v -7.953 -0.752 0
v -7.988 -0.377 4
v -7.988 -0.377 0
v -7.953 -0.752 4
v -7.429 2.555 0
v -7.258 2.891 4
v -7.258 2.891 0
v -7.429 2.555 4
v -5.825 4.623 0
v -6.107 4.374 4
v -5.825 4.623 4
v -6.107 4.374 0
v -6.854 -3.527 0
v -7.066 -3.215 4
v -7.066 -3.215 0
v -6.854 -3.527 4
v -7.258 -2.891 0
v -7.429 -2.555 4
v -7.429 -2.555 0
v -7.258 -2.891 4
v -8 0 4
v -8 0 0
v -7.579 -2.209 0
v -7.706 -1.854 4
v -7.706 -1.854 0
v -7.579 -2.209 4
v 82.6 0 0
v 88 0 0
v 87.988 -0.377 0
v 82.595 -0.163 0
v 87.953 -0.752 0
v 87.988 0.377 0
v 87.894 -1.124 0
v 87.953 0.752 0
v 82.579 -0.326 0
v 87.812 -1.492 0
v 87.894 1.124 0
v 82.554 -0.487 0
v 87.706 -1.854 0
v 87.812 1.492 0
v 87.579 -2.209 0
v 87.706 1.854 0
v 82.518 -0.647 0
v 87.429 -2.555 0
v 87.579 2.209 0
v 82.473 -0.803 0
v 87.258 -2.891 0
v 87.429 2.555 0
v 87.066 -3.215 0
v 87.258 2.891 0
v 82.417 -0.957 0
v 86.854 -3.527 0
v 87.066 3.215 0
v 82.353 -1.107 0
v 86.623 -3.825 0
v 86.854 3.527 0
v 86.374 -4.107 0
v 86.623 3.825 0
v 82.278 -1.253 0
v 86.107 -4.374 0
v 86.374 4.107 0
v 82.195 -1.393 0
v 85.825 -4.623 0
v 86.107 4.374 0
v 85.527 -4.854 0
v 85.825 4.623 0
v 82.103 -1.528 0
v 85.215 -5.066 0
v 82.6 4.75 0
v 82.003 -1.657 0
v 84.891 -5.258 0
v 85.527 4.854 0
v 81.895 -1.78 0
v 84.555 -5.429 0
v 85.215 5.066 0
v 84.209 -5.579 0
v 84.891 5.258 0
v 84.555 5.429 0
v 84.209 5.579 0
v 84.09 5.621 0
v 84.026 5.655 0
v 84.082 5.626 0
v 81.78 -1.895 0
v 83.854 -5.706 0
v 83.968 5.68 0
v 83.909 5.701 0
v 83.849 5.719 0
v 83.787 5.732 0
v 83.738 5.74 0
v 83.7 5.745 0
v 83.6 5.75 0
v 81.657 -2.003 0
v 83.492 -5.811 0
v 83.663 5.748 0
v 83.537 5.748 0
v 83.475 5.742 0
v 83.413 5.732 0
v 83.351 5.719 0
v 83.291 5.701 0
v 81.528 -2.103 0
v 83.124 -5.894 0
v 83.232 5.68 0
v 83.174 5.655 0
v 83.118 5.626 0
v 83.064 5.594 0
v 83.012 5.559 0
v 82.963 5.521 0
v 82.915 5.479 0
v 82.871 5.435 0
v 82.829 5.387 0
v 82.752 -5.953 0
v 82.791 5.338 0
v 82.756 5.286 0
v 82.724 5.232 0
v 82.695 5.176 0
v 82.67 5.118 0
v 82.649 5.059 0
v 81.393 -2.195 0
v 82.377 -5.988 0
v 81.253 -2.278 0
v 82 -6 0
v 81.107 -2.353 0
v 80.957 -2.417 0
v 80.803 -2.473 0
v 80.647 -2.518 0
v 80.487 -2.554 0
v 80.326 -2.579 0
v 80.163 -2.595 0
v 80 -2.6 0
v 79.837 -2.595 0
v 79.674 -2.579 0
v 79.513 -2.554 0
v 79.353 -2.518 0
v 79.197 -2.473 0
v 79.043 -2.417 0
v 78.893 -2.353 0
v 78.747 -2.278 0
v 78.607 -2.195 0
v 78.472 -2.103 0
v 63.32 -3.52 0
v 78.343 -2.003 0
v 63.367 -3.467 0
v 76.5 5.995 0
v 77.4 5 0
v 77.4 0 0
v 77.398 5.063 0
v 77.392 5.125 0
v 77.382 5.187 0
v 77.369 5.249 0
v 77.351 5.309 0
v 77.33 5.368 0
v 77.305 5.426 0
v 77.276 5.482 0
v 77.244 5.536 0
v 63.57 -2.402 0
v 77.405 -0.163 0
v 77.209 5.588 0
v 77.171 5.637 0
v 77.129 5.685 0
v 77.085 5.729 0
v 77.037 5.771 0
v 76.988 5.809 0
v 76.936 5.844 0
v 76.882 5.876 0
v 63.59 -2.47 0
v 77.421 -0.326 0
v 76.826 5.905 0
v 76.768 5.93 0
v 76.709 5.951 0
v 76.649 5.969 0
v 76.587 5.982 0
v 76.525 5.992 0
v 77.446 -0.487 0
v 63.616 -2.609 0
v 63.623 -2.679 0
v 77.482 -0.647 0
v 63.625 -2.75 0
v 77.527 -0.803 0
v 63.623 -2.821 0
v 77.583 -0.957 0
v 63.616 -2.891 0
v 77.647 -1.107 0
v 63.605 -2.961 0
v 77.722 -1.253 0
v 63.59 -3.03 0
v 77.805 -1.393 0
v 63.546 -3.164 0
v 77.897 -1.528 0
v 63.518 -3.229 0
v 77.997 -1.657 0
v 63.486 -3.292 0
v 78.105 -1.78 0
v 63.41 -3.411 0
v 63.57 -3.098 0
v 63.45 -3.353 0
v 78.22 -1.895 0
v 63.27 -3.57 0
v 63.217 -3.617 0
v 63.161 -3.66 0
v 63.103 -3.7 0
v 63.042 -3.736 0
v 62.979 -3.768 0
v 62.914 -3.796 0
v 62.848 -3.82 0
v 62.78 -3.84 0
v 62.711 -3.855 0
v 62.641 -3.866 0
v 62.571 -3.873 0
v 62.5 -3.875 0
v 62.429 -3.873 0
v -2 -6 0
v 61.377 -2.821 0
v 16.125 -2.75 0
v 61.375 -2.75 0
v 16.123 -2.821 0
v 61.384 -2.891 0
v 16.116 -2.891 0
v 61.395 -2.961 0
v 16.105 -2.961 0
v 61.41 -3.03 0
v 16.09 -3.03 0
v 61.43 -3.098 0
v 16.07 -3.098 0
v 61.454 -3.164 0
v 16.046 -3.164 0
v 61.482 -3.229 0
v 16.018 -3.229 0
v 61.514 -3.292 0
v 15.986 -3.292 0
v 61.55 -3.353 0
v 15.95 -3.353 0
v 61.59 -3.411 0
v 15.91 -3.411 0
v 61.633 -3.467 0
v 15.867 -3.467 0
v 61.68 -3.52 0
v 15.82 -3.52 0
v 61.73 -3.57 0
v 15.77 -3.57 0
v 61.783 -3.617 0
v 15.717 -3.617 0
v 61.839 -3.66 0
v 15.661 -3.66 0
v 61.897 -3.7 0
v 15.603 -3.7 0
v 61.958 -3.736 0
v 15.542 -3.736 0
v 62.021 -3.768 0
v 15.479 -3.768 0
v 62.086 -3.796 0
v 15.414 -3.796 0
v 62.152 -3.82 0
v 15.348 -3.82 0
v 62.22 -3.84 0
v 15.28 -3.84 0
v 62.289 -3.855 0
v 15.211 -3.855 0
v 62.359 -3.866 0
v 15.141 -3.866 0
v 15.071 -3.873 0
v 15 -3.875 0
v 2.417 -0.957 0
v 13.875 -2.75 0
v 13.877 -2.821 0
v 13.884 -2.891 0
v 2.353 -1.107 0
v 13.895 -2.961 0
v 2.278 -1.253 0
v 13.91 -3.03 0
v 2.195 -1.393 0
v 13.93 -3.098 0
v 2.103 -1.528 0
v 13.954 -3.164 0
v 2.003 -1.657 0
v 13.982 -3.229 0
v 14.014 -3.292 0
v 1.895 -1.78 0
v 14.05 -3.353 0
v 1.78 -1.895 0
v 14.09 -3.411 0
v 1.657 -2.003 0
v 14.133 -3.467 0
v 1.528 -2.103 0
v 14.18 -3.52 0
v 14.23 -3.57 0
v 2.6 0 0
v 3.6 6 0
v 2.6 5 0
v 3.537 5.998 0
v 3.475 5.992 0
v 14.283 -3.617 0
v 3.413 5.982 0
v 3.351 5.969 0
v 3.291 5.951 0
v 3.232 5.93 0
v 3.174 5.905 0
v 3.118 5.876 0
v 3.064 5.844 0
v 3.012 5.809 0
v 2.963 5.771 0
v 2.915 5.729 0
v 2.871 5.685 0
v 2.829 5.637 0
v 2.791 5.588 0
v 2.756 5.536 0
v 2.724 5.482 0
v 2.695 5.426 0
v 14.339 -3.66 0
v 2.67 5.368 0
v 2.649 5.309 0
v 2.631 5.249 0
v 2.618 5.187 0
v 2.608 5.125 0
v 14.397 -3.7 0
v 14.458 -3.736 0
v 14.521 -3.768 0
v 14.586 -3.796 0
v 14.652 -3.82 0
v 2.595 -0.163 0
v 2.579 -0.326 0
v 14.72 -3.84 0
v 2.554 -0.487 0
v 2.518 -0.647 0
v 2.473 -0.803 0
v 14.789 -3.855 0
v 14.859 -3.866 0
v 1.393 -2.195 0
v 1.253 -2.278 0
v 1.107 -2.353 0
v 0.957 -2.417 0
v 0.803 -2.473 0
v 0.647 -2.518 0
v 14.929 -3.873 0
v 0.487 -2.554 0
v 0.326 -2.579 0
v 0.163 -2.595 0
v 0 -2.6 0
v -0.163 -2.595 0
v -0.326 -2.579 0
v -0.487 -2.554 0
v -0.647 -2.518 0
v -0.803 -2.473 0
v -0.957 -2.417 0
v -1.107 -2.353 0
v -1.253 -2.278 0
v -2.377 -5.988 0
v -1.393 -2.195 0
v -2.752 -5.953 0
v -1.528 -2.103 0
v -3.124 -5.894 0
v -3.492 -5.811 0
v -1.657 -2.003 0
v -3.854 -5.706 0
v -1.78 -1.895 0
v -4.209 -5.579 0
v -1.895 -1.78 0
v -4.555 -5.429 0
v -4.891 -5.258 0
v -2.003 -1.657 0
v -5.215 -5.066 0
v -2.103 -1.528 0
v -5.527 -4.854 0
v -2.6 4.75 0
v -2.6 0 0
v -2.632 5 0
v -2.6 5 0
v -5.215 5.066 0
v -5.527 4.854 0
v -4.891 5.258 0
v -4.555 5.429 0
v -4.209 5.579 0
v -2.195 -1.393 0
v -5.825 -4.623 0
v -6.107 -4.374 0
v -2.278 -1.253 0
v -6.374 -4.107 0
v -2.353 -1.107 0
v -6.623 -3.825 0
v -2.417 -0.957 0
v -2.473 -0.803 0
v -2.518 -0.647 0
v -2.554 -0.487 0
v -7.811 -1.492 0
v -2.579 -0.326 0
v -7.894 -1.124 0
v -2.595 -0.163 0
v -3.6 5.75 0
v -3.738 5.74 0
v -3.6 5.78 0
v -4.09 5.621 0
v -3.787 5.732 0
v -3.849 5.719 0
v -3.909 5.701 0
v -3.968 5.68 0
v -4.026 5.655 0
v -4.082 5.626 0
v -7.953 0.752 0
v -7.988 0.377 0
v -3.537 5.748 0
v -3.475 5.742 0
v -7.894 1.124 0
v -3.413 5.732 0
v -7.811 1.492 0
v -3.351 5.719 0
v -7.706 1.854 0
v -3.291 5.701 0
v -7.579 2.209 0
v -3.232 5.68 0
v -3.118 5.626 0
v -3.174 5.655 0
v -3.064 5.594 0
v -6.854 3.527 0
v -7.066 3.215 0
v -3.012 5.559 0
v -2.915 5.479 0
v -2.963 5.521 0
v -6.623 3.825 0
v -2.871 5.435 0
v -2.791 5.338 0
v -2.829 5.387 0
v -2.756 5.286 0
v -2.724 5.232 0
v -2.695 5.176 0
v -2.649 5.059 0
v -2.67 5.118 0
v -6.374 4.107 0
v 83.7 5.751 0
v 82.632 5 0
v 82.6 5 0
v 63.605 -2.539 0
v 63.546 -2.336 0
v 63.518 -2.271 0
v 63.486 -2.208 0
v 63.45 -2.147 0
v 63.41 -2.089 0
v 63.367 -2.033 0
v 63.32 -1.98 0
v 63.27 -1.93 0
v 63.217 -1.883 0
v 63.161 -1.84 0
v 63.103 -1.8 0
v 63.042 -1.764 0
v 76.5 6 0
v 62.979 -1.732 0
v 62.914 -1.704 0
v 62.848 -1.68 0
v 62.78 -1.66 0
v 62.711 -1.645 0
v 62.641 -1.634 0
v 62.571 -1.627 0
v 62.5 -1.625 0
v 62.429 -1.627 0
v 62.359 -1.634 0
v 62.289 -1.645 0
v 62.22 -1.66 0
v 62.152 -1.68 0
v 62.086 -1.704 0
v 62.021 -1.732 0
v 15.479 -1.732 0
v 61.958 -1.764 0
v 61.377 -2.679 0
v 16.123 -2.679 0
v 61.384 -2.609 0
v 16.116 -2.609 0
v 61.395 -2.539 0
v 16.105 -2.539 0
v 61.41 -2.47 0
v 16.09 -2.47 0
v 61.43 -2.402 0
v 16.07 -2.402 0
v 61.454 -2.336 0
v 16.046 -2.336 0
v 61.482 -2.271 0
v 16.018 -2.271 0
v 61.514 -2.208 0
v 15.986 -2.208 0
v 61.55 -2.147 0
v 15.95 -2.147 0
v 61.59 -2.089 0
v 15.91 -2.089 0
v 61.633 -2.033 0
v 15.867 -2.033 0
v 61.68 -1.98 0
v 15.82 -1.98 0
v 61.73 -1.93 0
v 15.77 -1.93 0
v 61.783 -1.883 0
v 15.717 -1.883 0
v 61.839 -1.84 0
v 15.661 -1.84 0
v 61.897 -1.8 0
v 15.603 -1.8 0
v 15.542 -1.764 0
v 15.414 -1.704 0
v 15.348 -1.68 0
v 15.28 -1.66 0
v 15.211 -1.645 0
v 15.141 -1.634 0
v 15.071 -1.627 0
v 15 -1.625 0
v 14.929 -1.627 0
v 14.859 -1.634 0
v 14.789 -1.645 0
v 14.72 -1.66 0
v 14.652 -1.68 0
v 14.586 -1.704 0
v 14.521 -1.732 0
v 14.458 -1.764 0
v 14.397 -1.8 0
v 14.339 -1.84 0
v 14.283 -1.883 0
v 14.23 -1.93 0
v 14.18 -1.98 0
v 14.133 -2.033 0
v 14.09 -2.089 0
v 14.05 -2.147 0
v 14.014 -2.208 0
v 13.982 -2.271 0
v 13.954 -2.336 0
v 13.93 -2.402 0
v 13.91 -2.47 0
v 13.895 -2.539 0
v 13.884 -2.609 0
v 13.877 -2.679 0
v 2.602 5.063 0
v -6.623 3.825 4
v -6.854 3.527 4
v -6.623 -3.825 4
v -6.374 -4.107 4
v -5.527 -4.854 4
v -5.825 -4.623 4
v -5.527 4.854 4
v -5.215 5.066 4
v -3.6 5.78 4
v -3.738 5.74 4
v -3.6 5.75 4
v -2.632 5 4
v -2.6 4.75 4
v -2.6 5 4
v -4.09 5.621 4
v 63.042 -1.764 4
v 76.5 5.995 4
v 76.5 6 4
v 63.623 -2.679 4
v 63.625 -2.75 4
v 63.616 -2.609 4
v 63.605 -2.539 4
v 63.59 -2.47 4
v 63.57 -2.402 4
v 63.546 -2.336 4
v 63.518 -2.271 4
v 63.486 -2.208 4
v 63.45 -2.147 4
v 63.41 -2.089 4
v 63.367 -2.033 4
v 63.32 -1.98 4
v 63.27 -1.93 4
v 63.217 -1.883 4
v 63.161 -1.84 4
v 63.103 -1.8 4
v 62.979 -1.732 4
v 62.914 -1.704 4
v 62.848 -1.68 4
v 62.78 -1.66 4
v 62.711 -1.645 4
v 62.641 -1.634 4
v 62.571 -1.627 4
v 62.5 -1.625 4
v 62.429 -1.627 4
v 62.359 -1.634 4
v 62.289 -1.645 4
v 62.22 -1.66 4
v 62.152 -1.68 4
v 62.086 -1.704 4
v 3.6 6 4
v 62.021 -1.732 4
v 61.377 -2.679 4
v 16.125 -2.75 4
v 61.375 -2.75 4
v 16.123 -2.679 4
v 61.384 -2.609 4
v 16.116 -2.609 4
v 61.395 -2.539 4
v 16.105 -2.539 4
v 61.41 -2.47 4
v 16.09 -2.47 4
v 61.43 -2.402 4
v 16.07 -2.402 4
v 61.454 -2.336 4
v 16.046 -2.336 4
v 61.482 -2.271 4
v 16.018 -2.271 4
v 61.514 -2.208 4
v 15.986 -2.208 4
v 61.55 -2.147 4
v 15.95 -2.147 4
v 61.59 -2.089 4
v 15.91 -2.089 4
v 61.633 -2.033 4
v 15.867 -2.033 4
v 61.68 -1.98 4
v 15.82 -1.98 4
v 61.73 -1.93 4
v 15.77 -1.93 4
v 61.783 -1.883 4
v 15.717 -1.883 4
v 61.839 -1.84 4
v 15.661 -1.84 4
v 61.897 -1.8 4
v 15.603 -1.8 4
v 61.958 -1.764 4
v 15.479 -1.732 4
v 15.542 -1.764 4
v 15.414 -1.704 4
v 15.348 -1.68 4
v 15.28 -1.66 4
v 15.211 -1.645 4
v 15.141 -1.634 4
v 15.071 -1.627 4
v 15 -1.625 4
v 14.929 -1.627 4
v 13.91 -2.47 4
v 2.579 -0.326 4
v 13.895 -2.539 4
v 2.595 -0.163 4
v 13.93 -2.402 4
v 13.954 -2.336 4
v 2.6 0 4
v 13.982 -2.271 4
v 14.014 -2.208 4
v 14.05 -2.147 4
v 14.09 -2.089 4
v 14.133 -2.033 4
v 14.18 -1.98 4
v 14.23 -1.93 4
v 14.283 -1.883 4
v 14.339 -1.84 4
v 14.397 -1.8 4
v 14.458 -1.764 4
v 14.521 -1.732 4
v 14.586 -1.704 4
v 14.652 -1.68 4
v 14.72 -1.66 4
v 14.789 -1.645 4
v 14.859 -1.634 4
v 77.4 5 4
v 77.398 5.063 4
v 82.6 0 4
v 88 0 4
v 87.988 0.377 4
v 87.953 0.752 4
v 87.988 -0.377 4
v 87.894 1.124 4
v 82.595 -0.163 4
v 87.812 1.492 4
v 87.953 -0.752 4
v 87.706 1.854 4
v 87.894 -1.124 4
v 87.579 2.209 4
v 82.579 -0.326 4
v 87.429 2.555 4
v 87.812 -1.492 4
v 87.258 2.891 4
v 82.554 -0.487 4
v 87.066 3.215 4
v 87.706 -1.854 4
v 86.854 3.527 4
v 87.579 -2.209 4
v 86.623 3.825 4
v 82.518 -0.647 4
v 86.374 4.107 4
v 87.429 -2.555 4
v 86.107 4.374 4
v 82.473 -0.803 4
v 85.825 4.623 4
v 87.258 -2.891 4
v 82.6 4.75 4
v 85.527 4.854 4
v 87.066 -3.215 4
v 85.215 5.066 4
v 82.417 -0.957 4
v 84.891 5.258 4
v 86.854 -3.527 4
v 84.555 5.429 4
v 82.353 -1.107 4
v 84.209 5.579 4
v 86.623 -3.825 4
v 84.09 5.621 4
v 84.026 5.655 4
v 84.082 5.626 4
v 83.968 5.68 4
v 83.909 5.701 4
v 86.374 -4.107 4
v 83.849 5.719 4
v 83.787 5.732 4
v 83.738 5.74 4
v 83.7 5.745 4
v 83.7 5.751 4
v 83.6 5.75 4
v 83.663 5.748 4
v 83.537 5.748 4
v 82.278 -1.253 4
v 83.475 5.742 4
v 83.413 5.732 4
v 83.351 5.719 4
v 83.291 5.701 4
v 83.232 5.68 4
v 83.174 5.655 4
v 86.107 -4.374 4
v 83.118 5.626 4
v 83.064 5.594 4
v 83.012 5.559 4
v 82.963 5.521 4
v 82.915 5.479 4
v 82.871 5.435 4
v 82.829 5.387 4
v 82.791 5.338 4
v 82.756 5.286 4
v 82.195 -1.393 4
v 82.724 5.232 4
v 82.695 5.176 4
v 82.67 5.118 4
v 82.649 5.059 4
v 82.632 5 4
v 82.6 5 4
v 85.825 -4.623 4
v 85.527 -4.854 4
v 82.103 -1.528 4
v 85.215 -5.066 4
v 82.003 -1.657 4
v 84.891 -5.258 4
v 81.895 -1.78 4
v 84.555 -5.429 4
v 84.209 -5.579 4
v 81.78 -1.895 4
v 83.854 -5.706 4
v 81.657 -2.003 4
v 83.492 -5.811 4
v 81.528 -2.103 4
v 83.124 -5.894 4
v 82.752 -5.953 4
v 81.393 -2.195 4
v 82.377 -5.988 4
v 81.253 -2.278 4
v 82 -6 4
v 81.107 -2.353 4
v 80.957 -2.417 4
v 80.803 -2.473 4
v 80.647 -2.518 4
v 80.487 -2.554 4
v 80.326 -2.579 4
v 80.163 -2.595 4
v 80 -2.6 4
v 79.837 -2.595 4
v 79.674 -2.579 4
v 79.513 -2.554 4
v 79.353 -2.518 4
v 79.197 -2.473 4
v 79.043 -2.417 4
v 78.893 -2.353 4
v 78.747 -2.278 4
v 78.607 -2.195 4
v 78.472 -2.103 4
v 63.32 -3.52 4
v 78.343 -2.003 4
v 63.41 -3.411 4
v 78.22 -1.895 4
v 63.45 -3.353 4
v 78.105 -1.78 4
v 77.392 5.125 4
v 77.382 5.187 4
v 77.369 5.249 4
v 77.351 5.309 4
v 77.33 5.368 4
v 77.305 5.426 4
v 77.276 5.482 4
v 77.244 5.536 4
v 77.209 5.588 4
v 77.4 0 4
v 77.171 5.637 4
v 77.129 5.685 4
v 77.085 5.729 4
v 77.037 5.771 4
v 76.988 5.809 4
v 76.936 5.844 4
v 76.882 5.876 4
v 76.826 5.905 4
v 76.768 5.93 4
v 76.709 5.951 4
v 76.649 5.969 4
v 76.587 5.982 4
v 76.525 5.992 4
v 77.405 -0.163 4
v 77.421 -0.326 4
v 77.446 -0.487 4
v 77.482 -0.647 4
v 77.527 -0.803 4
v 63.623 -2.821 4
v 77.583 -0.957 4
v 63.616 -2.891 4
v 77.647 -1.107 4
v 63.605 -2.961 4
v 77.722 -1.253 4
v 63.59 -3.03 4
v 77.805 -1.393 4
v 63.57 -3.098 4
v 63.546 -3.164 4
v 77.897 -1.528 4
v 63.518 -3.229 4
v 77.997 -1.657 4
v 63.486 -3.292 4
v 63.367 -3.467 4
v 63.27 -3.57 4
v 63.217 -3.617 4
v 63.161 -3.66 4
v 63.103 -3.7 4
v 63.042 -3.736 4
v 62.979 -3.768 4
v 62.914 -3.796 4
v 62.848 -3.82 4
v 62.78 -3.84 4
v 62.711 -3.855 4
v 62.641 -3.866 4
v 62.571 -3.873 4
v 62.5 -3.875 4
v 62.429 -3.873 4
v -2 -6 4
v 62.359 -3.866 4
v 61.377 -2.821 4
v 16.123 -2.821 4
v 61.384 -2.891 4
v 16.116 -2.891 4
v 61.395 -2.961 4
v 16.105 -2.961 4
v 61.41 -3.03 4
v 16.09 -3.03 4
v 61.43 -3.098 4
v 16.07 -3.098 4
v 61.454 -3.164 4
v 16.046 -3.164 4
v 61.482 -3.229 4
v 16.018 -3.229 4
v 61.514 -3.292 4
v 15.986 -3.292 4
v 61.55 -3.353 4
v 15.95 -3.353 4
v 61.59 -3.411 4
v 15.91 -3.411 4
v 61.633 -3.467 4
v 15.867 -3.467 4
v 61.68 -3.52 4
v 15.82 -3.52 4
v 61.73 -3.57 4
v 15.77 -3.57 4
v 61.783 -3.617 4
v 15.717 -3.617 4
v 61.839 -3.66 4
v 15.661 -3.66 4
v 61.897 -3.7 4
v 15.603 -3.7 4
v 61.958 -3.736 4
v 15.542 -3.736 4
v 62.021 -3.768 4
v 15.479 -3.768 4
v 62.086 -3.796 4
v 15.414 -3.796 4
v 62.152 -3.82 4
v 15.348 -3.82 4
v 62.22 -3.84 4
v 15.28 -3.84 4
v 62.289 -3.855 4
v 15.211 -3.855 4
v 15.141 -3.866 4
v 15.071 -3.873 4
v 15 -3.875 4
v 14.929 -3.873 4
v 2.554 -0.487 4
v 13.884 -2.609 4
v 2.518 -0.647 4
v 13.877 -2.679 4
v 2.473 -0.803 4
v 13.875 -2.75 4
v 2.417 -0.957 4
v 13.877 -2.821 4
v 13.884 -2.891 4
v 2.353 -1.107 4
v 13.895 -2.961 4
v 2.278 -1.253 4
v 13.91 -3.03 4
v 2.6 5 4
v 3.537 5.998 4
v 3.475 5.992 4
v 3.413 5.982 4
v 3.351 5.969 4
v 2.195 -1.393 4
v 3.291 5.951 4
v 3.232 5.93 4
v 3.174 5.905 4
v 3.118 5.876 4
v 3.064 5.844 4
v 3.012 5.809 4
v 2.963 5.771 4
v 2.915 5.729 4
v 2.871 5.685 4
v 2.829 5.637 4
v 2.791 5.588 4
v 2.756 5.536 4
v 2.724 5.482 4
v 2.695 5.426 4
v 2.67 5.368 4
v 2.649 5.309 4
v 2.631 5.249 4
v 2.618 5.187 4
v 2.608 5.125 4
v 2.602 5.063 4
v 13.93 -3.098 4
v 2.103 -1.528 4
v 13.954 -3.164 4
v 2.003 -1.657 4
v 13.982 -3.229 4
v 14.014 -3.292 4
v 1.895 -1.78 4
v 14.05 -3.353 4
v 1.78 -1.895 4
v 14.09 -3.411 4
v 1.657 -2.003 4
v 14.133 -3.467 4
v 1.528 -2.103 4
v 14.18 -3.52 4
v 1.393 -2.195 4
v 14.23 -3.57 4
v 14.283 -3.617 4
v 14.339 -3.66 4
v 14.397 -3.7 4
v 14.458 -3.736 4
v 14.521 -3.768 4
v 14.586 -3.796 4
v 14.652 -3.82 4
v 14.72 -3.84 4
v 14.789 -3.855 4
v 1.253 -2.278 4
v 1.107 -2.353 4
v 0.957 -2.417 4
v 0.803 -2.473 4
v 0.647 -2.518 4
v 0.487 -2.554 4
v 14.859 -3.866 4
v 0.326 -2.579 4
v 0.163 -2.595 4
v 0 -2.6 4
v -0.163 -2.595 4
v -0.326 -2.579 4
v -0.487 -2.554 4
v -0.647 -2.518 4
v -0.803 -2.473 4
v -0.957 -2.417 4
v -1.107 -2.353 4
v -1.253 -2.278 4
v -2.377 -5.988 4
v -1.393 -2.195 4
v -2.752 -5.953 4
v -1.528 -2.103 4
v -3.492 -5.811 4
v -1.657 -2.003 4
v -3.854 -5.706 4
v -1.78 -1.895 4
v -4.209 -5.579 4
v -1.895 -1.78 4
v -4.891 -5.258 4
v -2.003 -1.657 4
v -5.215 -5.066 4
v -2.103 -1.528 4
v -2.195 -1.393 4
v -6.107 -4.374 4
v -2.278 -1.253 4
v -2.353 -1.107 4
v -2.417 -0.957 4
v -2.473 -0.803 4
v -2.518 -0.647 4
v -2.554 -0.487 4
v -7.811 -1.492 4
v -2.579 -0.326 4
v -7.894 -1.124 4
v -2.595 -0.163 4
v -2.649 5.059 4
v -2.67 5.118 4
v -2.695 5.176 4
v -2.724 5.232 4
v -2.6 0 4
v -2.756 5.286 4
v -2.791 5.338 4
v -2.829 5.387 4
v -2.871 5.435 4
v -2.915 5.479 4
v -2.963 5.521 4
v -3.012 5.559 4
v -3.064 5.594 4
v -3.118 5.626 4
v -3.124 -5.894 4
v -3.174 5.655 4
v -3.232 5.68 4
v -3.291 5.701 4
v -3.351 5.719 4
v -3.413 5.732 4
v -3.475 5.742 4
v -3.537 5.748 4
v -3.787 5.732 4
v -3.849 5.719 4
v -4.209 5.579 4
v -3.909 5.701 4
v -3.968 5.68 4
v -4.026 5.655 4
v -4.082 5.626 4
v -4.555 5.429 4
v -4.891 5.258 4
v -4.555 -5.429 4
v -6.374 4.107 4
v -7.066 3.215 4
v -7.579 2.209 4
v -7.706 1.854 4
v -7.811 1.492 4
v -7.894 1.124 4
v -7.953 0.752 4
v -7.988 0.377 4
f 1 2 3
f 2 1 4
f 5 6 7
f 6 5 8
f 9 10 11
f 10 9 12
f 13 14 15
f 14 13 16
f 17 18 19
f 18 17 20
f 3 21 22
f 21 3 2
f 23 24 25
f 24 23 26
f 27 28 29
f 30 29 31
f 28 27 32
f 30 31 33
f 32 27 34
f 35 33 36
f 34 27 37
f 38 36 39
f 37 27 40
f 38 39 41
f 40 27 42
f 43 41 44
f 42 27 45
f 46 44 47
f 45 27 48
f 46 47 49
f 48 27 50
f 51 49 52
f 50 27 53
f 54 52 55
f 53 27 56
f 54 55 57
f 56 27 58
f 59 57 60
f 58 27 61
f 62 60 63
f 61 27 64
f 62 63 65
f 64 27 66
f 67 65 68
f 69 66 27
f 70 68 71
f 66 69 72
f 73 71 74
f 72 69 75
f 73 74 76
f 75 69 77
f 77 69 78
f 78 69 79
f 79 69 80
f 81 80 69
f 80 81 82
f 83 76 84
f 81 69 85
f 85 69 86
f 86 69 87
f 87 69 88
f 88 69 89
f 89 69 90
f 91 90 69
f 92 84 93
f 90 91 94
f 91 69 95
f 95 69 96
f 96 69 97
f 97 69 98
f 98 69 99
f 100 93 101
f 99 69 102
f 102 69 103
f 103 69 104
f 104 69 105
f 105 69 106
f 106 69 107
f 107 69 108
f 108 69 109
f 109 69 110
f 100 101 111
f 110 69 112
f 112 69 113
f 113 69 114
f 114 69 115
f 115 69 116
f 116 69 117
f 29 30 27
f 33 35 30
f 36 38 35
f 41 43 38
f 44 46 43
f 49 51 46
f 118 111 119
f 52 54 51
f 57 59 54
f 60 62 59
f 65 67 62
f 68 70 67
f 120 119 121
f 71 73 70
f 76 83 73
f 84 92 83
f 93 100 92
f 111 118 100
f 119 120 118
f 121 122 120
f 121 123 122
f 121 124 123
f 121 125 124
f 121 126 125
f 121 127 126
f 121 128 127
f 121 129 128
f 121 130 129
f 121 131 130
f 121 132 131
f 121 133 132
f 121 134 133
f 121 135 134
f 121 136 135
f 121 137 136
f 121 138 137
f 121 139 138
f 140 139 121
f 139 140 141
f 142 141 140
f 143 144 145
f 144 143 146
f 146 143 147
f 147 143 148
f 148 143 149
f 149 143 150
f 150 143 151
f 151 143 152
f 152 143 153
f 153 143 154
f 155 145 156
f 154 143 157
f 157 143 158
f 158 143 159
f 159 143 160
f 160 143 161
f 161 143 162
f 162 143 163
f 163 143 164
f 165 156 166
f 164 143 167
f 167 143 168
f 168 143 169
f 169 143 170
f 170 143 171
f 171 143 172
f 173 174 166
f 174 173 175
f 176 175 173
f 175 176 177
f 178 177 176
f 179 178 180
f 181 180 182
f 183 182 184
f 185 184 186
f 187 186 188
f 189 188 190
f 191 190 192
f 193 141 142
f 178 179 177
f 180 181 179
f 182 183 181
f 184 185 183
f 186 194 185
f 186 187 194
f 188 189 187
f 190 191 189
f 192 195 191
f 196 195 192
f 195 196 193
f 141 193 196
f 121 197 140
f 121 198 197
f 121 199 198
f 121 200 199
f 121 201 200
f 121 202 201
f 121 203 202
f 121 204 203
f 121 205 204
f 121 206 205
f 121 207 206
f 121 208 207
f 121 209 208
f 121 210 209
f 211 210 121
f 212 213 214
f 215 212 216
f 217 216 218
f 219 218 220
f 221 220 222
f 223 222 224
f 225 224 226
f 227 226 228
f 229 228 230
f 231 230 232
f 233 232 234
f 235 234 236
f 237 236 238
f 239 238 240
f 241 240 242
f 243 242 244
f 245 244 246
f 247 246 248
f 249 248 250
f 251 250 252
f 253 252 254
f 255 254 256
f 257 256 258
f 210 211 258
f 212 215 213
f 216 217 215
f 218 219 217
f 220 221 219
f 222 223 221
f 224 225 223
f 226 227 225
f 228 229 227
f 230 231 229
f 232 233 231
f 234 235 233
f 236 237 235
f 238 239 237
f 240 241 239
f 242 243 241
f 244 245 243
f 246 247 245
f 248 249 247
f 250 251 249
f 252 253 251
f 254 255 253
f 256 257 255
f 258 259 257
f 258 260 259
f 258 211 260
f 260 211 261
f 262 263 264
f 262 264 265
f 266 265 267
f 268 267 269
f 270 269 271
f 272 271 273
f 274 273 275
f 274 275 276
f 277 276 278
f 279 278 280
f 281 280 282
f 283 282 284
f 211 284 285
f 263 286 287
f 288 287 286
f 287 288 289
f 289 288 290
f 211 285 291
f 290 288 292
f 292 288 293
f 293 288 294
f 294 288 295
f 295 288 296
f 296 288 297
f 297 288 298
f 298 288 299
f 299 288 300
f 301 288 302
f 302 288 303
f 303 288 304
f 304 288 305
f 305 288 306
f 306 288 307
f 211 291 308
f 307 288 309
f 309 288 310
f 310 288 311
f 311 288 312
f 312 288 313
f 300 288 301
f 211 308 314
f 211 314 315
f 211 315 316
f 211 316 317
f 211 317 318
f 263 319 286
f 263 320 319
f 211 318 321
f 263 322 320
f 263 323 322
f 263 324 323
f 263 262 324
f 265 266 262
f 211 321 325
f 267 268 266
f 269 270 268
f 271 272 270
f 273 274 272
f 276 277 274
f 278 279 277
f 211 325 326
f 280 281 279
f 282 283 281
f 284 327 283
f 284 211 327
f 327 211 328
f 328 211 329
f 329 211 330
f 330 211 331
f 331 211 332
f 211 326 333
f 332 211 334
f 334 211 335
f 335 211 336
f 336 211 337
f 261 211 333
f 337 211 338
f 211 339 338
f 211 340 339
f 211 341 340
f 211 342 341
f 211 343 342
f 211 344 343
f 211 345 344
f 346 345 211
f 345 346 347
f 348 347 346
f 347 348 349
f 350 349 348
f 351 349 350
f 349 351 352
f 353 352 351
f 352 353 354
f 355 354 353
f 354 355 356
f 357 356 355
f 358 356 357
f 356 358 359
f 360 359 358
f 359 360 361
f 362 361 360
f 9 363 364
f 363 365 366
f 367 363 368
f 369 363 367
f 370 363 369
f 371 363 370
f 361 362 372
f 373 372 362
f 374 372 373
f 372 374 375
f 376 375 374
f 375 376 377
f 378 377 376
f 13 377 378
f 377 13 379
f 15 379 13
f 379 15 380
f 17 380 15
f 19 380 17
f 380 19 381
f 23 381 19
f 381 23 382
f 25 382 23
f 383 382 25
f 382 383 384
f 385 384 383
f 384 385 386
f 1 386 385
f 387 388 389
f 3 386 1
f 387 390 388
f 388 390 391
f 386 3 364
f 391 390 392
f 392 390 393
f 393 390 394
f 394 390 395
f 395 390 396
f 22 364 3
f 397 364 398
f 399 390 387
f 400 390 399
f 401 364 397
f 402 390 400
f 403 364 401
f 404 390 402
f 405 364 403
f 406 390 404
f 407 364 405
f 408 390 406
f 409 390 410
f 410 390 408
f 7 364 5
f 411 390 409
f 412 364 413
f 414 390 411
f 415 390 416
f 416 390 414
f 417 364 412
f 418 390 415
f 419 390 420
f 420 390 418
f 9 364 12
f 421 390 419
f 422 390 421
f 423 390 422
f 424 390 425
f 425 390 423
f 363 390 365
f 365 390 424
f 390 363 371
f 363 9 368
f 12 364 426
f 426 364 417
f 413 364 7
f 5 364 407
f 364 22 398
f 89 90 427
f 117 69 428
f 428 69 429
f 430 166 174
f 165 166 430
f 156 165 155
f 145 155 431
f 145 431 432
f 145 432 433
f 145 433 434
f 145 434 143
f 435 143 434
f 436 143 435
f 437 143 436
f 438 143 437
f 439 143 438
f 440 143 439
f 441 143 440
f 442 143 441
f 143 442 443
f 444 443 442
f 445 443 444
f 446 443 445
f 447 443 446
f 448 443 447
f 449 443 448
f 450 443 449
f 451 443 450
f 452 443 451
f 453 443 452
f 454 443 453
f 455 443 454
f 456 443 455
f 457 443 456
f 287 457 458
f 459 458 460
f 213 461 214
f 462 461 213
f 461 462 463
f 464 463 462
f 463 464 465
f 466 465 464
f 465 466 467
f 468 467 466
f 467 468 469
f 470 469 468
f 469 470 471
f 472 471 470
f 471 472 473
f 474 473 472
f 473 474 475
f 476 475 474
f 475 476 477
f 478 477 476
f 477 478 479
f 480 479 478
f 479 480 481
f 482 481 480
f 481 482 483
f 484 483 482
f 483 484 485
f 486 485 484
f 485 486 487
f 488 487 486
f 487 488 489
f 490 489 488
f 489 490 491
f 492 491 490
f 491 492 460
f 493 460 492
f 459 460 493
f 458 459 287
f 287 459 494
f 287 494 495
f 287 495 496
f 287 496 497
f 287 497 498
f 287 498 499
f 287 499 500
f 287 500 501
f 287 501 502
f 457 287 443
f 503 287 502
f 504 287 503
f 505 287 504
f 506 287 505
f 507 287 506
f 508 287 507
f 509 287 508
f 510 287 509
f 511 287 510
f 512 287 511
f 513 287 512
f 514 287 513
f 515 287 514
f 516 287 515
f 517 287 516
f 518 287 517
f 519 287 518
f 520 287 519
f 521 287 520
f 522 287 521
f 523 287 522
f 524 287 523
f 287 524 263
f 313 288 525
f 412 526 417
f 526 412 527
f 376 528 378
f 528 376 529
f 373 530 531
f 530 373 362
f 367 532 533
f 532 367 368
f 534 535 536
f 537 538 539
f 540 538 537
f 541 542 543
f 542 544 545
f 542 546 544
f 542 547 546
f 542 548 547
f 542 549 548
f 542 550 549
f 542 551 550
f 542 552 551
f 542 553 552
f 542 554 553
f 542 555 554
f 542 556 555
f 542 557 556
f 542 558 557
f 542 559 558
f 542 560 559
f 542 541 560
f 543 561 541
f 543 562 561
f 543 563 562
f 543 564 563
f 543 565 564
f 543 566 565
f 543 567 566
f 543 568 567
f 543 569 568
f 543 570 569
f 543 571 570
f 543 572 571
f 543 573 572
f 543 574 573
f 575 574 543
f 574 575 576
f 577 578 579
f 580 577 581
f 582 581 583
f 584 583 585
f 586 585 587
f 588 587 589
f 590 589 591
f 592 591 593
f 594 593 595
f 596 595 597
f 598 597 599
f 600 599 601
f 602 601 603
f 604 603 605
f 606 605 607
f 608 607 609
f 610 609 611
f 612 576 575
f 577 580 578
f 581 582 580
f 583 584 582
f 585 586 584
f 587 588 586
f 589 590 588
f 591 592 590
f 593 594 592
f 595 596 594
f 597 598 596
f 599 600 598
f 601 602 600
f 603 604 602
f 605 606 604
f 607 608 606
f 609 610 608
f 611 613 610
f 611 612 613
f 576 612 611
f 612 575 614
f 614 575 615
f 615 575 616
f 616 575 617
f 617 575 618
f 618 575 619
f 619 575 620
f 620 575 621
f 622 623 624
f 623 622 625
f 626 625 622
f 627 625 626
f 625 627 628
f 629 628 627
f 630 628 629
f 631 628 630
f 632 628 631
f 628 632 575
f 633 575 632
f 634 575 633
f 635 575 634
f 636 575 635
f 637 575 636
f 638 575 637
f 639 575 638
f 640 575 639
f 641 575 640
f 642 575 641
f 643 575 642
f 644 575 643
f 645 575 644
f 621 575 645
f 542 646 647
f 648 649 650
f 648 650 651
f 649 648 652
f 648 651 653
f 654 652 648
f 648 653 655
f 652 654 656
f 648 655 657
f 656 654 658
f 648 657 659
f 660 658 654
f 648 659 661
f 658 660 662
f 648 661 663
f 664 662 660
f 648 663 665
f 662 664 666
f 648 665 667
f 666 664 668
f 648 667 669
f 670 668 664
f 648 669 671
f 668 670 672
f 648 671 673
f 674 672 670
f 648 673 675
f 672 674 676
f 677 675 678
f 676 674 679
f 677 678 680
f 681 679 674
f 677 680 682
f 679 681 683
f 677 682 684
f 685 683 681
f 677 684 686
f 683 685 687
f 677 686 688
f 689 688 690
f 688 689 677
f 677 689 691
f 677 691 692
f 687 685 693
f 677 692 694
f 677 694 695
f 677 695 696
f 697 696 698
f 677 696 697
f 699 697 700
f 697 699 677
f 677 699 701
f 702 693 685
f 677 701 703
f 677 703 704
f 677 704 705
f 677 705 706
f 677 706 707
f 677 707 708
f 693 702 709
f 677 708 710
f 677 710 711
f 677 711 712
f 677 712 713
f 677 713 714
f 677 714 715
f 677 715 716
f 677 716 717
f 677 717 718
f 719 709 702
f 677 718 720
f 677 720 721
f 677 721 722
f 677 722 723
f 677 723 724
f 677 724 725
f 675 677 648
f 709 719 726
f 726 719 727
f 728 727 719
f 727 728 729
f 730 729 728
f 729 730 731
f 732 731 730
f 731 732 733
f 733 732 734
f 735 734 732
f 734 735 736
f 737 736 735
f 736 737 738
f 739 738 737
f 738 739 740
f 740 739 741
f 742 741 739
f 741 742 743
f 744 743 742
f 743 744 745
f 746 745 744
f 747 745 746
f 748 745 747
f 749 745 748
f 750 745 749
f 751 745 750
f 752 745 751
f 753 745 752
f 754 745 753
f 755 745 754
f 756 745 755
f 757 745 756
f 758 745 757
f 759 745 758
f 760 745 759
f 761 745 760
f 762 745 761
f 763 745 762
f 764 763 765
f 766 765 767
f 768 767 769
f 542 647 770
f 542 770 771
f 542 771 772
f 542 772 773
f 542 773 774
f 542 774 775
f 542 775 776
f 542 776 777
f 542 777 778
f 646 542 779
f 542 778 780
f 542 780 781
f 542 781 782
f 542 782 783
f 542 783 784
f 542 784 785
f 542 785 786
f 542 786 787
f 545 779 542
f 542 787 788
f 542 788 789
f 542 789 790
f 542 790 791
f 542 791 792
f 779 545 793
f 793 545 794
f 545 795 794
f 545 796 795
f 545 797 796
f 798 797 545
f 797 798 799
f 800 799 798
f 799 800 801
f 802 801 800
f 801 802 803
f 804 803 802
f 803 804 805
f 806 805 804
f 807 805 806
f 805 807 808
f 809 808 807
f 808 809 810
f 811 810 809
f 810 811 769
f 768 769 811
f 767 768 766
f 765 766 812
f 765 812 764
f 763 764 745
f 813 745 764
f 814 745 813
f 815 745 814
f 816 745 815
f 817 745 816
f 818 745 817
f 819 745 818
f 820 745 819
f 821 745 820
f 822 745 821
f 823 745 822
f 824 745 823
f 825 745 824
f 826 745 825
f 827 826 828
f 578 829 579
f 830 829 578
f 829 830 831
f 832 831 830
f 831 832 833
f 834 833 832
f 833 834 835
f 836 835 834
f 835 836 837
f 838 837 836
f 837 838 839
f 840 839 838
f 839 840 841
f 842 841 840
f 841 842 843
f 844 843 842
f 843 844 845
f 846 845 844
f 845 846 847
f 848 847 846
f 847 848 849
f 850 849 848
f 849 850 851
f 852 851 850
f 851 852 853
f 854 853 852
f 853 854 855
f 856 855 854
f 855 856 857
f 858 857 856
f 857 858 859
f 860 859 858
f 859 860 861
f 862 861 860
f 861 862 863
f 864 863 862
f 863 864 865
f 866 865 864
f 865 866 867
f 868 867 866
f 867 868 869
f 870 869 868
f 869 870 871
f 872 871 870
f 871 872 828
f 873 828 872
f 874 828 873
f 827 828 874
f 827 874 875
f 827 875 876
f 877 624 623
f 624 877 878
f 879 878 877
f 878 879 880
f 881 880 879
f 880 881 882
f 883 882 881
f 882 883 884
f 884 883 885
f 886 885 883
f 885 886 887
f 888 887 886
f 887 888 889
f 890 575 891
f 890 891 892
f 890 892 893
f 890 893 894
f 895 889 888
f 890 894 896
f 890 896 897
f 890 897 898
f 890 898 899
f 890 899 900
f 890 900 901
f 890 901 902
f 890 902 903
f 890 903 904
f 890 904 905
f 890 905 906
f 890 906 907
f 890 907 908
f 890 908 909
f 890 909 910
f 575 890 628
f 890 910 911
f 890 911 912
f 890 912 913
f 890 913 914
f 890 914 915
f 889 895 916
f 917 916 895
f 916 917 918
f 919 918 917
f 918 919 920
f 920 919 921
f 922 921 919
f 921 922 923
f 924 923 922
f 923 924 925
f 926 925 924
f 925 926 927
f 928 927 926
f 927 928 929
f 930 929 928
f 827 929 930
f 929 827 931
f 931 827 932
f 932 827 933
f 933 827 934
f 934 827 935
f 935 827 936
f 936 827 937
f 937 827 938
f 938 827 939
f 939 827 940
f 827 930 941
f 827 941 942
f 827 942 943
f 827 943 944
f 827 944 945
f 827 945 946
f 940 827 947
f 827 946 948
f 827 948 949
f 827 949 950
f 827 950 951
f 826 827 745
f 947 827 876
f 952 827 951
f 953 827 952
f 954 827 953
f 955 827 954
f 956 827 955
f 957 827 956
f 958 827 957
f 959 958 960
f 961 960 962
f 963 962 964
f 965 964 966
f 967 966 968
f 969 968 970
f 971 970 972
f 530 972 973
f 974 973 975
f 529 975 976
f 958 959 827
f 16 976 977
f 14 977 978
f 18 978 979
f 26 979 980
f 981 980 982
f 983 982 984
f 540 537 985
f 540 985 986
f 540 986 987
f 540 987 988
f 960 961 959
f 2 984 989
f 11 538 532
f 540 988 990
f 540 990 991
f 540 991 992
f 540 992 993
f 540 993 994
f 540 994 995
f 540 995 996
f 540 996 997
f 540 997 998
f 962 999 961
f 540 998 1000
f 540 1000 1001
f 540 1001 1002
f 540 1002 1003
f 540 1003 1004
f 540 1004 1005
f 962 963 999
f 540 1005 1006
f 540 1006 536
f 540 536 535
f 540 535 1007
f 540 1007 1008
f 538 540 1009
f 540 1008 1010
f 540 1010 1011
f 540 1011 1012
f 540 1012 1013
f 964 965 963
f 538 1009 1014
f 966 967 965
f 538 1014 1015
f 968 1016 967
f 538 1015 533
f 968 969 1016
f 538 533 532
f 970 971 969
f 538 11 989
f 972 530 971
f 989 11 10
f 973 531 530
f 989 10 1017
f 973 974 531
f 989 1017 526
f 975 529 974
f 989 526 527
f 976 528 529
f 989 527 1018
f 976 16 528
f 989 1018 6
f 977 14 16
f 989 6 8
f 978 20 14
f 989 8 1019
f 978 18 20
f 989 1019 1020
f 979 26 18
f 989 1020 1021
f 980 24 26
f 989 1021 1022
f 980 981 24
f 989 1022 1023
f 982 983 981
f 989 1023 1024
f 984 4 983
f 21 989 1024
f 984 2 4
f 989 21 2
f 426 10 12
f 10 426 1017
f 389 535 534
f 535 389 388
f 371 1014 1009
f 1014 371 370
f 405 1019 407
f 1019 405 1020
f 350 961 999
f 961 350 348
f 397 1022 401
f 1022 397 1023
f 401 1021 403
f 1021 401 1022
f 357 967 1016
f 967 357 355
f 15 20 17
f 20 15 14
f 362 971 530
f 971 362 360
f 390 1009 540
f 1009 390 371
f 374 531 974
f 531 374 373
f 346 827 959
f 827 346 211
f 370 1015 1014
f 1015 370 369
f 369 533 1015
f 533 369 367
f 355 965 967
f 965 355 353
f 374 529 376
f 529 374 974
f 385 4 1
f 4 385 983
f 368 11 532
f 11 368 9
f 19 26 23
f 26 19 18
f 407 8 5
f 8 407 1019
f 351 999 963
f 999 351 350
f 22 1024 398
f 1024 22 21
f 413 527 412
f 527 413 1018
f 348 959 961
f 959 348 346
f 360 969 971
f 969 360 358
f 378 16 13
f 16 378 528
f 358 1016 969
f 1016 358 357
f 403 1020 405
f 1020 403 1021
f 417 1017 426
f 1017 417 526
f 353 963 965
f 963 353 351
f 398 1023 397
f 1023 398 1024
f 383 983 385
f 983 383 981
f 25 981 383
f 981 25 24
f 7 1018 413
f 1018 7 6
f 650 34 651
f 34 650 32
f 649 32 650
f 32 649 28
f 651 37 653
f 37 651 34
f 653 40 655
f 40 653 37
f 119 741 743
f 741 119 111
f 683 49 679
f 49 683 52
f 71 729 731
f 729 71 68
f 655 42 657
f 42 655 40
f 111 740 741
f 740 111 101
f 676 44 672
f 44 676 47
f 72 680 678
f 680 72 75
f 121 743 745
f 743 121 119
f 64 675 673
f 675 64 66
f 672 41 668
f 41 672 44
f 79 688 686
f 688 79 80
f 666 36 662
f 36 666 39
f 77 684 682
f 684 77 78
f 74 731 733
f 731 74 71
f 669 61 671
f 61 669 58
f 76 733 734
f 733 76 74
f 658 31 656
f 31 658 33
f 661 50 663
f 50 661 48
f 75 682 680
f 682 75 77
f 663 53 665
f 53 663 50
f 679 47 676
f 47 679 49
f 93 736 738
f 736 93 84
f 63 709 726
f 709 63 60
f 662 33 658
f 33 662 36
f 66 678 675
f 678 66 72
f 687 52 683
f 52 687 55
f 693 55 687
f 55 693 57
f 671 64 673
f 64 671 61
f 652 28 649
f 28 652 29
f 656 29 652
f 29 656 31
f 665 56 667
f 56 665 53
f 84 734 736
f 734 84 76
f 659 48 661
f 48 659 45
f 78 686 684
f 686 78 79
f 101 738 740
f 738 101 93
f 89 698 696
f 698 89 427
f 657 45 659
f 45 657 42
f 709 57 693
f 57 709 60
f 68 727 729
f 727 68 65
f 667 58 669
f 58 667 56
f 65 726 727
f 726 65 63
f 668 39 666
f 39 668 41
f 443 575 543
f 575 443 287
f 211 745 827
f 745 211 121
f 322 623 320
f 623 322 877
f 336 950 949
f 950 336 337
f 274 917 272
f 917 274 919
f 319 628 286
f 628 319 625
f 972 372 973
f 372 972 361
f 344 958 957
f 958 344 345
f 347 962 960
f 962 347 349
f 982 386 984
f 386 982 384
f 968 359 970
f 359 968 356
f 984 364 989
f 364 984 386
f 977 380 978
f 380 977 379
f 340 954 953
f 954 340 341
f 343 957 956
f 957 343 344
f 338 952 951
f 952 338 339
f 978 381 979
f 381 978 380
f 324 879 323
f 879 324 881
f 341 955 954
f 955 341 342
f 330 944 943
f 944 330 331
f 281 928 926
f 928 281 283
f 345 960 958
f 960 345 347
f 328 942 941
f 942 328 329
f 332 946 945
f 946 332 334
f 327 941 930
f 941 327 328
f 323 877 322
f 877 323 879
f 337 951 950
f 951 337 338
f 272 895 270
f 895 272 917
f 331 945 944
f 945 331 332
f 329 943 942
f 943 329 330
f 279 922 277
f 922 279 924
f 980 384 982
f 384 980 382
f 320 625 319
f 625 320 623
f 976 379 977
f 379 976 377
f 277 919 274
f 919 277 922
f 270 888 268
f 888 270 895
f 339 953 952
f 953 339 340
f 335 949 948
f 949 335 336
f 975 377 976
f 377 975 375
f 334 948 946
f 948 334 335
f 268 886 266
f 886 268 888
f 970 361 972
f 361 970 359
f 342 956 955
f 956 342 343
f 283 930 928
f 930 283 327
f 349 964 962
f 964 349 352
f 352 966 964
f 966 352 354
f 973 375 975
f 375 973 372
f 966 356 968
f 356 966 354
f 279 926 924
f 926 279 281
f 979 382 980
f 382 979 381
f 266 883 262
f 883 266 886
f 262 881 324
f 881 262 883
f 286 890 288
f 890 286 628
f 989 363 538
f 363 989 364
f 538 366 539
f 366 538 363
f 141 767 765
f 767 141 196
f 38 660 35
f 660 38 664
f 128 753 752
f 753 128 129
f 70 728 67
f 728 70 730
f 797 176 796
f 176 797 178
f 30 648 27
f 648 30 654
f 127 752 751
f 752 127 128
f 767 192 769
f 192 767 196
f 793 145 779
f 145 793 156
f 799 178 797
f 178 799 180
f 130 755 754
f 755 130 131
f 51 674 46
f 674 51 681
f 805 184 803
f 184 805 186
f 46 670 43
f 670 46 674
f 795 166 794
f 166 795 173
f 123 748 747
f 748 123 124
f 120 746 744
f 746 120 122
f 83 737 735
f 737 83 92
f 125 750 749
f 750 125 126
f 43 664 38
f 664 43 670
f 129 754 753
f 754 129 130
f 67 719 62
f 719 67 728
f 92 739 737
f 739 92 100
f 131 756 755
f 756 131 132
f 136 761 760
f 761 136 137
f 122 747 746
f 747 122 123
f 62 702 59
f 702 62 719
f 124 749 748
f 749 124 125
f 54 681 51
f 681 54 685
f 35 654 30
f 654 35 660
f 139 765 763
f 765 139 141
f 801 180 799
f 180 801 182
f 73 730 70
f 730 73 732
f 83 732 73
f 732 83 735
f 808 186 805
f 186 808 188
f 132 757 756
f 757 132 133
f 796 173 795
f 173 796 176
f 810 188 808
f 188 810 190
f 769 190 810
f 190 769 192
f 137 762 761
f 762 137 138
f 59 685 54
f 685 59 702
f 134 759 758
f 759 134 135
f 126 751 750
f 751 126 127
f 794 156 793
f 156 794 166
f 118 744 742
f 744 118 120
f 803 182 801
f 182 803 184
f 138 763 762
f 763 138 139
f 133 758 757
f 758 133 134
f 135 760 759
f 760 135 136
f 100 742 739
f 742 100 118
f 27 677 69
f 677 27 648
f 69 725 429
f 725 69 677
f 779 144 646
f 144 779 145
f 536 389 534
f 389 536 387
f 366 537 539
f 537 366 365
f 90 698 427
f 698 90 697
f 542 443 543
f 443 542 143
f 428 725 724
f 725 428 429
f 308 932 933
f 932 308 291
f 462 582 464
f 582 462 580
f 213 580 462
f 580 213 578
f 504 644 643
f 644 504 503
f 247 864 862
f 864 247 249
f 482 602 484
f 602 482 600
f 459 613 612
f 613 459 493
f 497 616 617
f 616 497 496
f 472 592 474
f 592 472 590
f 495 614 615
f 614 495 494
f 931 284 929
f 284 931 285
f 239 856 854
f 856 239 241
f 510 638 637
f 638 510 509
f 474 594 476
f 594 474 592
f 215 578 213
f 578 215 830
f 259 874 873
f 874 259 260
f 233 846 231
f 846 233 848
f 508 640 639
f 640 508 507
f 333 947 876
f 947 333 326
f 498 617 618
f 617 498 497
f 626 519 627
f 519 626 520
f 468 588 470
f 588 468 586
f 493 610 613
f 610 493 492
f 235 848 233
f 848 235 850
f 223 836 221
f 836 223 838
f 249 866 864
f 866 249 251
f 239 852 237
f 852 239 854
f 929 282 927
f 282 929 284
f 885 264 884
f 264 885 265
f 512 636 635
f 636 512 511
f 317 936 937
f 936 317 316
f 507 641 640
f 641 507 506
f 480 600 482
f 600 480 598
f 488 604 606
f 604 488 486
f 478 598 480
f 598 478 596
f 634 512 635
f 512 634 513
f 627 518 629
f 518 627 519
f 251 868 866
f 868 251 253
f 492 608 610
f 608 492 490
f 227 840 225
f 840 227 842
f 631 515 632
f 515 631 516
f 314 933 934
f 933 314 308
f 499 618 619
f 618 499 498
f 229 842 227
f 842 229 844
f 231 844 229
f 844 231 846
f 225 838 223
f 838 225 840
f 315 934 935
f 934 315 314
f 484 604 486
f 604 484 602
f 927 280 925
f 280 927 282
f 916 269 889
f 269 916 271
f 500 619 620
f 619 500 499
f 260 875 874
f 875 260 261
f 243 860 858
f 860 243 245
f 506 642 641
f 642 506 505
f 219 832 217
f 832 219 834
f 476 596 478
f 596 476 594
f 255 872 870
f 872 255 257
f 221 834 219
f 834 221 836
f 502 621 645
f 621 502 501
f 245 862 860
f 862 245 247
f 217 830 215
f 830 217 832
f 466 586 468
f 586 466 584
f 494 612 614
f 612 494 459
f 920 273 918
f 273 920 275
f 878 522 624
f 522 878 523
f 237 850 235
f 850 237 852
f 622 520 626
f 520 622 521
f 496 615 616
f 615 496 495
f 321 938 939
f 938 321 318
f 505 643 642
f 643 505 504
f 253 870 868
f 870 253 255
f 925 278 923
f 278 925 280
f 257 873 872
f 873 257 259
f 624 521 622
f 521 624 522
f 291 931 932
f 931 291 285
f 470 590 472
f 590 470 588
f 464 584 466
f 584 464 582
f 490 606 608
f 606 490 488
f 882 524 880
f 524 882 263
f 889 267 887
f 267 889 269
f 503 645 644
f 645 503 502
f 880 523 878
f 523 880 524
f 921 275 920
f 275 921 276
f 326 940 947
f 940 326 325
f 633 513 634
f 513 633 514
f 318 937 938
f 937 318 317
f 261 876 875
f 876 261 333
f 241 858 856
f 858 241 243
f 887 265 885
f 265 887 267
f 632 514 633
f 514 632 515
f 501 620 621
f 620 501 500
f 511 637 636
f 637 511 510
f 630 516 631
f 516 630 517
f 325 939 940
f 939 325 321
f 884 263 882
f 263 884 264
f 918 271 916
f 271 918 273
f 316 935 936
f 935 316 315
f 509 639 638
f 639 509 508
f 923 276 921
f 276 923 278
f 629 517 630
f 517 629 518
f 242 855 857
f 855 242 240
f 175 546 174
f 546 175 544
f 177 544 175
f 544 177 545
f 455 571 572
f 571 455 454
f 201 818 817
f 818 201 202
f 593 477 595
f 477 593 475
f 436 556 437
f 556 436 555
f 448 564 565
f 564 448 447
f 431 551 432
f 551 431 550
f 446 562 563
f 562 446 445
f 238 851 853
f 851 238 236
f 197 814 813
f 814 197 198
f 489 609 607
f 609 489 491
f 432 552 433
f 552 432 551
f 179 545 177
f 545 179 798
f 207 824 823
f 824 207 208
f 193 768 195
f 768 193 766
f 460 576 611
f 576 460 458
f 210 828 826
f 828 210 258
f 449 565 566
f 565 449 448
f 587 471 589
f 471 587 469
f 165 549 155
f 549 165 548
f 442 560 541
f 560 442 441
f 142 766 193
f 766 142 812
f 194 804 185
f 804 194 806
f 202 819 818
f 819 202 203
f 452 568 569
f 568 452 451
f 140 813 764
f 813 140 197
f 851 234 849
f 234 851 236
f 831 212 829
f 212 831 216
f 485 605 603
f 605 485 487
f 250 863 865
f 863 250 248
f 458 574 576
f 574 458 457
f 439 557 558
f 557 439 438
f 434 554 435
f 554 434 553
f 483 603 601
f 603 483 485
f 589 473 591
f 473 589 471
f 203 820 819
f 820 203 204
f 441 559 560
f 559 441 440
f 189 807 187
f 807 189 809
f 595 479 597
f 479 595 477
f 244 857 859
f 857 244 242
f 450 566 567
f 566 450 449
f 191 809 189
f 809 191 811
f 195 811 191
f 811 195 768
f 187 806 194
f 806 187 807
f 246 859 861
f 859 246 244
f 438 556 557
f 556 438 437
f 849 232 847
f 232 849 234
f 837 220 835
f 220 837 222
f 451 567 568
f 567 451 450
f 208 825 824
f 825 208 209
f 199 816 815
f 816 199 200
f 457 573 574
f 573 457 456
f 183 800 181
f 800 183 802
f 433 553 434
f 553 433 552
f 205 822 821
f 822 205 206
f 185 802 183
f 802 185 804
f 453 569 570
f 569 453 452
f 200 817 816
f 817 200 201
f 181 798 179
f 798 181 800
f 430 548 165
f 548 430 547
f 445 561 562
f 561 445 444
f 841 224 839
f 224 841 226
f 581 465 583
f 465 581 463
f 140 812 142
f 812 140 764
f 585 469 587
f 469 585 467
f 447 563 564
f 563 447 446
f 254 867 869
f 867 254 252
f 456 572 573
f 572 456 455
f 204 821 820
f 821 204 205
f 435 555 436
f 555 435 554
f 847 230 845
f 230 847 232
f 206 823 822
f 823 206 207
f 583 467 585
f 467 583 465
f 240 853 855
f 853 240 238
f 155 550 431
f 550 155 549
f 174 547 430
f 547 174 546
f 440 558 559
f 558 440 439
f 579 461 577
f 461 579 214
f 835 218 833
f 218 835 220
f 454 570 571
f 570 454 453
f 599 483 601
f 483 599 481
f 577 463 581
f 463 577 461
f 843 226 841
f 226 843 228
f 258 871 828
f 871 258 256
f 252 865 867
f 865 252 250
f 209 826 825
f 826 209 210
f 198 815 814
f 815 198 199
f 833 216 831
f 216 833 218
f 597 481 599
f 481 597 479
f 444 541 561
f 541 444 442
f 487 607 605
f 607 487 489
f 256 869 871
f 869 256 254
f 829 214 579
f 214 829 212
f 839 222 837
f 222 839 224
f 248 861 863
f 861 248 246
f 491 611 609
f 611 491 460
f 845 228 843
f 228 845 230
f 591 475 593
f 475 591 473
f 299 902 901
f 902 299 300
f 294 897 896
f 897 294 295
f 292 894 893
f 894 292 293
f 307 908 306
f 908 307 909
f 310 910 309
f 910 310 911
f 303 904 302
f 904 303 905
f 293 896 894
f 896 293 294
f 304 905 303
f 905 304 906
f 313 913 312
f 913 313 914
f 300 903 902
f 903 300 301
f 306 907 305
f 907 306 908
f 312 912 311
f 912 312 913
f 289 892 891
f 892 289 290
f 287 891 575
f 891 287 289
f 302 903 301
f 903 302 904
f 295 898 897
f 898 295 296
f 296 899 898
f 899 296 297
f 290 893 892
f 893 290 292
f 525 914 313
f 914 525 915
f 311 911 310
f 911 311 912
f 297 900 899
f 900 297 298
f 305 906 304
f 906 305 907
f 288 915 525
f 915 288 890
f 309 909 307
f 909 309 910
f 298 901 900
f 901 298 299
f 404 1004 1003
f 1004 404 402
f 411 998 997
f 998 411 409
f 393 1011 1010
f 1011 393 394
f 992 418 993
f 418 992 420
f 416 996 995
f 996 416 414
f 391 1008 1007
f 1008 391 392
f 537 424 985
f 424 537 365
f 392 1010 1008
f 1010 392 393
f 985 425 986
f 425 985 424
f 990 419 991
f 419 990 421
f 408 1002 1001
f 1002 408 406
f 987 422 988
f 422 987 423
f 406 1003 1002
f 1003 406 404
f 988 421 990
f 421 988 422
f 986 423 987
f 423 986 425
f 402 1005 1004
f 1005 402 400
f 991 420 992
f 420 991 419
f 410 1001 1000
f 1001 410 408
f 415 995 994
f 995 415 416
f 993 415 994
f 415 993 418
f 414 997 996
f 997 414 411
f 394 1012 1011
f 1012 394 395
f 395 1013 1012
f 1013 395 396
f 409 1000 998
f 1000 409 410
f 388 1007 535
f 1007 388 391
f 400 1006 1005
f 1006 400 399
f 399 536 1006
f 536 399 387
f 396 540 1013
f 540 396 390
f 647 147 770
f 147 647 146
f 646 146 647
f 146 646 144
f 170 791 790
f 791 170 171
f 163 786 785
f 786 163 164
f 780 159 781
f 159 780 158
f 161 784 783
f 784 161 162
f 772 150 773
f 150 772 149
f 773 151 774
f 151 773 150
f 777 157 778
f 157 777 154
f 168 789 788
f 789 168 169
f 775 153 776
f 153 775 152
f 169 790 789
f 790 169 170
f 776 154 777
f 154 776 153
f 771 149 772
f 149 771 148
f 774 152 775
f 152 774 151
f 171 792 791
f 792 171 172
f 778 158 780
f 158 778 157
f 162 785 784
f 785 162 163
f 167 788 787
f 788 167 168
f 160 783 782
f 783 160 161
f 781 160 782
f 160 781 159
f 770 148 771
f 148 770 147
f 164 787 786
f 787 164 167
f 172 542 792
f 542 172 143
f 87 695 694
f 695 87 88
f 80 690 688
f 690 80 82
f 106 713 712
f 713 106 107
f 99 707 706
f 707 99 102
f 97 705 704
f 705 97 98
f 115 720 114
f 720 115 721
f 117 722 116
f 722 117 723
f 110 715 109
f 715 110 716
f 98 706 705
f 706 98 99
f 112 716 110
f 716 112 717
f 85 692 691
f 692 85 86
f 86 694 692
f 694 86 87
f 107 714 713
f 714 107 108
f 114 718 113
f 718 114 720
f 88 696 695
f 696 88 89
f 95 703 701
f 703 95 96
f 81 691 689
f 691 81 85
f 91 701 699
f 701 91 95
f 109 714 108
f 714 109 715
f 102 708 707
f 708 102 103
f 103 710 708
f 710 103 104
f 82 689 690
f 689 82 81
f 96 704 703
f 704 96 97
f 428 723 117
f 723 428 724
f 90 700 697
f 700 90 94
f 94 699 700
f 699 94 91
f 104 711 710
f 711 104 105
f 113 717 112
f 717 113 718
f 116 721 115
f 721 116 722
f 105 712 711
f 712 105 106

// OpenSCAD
smooth = 1;

base_w=20;
base_l=100;
base_h = 4;

gap_h = 4;

cap_d = 12;
cap_h = 4;

post_d = 5;


//clip_w = 12-2*smooth;
//clip_l = 98;
//clip_h = 4-2*smooth;

clip_w = 12;
clip_l = 98;
clip_h = 4;

angle_l = 65;
angle = 15;

screw_d = 2.25;
screw_offset_l = 15;
screw_offset_ctr=clip_w/2-3.25;

clear = 0.2;
delta = 0.01;
$fn=100;

module base() {
    //base
    cylinder(d=base_w,h=base_h,center=false);
    translate([base_l-base_w,0,0]) cylinder(d=base_w,h=base_h,center=false);
    translate([0,-base_w/2,0]) cube([base_l-base_w,base_w,base_h]);

    //posts
    translate([0,0,base_h])cylinder(d=post_d,h=gap_h,center=false);
    translate([base_l-base_w,0,base_h])cylinder(d=post_d,h=gap_h,center=false);

    //caps
    translate([0,0,base_h+gap_h+smooth]) minkowski(){ cylinder(d=cap_d-2*smooth,h=cap_h-2*smooth,center=false); sphere(smooth);}
    translate([base_l-base_w,0,base_h+gap_h+smooth]) minkowski() { cylinder(d=cap_d-2*smooth,h=cap_h-2*smooth,center=false); sphere(smooth);}
}

module smooth_clip() {
    difference() {
        minkowski() {
        union() {
            //base
            cylinder(d=clip_w,h=clip_h,center=false);
            translate([clip_l-clip_w,0,0]) cylinder(d=clip_w,h=clip_h,center=false);
            translate([0,-clip_w/2,0]) cube([clip_l-clip_w,clip_w,clip_h]);
        }
        sphere(smooth);
        }

    //posts
    translate([0,0,-smooth-delta])cylinder(d=post_d,h=gap_h+2,center=false);
    translate([-post_d/2,0,-smooth-delta])cube([post_d,clip_w,clip_h+3*smooth]);

    translate([clip_l-clip_w,0,-smooth-delta])cylinder(d=post_d,h=gap_h+3*smooth,center=false);
    translate([clip_l-clip_w-post_d/2,0,-smooth-delta])cube([post_d,clip_w,clip_h+3*smooth]);

    }
 }
 
 module clip() {
    difference() {
        union() {
            //base
            translate([-2,0,0])cylinder(d=clip_w,h=clip_h,center=false);
            translate([clip_l-clip_w-4,0,0]) cylinder(d=clip_w,h=clip_h,center=false);
            translate([-2,-clip_w/2,0]) cube([clip_l-clip_w-2,clip_w,clip_h]);
//            translate([(clip_l-2*clip_w-angle_l-2),-clip_w/2+tan(angle-5)*clip_h,0])rotate([angle,0,0])cube([angle_l,clip_w,clip_h]); 
        }

    //post cuts
    translate([0,0,-delta])cylinder(d=post_d+clear,h=2*gap_h,center=false);
    translate([-(post_d+clear)/2,0,-delta])cube([post_d+clear,clip_w,clip_h+3]);

    //cuts to the edge
    translate([base_l-base_w,0,-delta])cylinder(d=post_d+clear,h=2*gap_h,center=false);    
    translate([base_l-base_w-(post_d+clear)/2,0,-delta])cube([post_d+clear,clip_w,clip_h+3]);

    //cuts to allow for rounded inside corners
    translate([-(post_d+clear)/2-1,clip_w/2-1,-delta])cube([(post_d+clear+2),2,clip_h+3]);
    translate([base_l-base_w-(post_d+clear-1.7),clip_w/2-1,-delta])cube([(post_d+clear+2),2,clip_h+3]);
    
    //screw_holes
    translate([screw_offset_l,-screw_offset_ctr,-delta])cylinder(d=screw_d,h=2*gap_h,center=false);
    translate([base_l-base_w-post_d/2-screw_offset_l,-screw_offset_ctr,-delta])cylinder(d=screw_d,h=2*gap_h,center=false);
        
    }
    color("red",1.0) translate([(post_d+clear)/2+1,clip_w/2-1,0]) cylinder(d=2,h=clip_h,center=false);
    color("red",1.0) translate([-(post_d+clear)/2-1,clip_w/2-1.25,0]) cylinder(d=2,h=clip_h,center=false);

    color("red",1.0) translate([clip_l-clip_w-4.4-(post_d+clear),clip_w/2-1,0]) cylinder(d=2,h=clip_h,center=false);
    color("red",1.0) translate([clip_l-clip_w-2.4,clip_w/2-1.25,0]) cylinder(d=2,h=clip_h,center=false);
 }
 
// base();
clip();
// translate([0,0,base_h]) color("green",1.0) clip();
 
